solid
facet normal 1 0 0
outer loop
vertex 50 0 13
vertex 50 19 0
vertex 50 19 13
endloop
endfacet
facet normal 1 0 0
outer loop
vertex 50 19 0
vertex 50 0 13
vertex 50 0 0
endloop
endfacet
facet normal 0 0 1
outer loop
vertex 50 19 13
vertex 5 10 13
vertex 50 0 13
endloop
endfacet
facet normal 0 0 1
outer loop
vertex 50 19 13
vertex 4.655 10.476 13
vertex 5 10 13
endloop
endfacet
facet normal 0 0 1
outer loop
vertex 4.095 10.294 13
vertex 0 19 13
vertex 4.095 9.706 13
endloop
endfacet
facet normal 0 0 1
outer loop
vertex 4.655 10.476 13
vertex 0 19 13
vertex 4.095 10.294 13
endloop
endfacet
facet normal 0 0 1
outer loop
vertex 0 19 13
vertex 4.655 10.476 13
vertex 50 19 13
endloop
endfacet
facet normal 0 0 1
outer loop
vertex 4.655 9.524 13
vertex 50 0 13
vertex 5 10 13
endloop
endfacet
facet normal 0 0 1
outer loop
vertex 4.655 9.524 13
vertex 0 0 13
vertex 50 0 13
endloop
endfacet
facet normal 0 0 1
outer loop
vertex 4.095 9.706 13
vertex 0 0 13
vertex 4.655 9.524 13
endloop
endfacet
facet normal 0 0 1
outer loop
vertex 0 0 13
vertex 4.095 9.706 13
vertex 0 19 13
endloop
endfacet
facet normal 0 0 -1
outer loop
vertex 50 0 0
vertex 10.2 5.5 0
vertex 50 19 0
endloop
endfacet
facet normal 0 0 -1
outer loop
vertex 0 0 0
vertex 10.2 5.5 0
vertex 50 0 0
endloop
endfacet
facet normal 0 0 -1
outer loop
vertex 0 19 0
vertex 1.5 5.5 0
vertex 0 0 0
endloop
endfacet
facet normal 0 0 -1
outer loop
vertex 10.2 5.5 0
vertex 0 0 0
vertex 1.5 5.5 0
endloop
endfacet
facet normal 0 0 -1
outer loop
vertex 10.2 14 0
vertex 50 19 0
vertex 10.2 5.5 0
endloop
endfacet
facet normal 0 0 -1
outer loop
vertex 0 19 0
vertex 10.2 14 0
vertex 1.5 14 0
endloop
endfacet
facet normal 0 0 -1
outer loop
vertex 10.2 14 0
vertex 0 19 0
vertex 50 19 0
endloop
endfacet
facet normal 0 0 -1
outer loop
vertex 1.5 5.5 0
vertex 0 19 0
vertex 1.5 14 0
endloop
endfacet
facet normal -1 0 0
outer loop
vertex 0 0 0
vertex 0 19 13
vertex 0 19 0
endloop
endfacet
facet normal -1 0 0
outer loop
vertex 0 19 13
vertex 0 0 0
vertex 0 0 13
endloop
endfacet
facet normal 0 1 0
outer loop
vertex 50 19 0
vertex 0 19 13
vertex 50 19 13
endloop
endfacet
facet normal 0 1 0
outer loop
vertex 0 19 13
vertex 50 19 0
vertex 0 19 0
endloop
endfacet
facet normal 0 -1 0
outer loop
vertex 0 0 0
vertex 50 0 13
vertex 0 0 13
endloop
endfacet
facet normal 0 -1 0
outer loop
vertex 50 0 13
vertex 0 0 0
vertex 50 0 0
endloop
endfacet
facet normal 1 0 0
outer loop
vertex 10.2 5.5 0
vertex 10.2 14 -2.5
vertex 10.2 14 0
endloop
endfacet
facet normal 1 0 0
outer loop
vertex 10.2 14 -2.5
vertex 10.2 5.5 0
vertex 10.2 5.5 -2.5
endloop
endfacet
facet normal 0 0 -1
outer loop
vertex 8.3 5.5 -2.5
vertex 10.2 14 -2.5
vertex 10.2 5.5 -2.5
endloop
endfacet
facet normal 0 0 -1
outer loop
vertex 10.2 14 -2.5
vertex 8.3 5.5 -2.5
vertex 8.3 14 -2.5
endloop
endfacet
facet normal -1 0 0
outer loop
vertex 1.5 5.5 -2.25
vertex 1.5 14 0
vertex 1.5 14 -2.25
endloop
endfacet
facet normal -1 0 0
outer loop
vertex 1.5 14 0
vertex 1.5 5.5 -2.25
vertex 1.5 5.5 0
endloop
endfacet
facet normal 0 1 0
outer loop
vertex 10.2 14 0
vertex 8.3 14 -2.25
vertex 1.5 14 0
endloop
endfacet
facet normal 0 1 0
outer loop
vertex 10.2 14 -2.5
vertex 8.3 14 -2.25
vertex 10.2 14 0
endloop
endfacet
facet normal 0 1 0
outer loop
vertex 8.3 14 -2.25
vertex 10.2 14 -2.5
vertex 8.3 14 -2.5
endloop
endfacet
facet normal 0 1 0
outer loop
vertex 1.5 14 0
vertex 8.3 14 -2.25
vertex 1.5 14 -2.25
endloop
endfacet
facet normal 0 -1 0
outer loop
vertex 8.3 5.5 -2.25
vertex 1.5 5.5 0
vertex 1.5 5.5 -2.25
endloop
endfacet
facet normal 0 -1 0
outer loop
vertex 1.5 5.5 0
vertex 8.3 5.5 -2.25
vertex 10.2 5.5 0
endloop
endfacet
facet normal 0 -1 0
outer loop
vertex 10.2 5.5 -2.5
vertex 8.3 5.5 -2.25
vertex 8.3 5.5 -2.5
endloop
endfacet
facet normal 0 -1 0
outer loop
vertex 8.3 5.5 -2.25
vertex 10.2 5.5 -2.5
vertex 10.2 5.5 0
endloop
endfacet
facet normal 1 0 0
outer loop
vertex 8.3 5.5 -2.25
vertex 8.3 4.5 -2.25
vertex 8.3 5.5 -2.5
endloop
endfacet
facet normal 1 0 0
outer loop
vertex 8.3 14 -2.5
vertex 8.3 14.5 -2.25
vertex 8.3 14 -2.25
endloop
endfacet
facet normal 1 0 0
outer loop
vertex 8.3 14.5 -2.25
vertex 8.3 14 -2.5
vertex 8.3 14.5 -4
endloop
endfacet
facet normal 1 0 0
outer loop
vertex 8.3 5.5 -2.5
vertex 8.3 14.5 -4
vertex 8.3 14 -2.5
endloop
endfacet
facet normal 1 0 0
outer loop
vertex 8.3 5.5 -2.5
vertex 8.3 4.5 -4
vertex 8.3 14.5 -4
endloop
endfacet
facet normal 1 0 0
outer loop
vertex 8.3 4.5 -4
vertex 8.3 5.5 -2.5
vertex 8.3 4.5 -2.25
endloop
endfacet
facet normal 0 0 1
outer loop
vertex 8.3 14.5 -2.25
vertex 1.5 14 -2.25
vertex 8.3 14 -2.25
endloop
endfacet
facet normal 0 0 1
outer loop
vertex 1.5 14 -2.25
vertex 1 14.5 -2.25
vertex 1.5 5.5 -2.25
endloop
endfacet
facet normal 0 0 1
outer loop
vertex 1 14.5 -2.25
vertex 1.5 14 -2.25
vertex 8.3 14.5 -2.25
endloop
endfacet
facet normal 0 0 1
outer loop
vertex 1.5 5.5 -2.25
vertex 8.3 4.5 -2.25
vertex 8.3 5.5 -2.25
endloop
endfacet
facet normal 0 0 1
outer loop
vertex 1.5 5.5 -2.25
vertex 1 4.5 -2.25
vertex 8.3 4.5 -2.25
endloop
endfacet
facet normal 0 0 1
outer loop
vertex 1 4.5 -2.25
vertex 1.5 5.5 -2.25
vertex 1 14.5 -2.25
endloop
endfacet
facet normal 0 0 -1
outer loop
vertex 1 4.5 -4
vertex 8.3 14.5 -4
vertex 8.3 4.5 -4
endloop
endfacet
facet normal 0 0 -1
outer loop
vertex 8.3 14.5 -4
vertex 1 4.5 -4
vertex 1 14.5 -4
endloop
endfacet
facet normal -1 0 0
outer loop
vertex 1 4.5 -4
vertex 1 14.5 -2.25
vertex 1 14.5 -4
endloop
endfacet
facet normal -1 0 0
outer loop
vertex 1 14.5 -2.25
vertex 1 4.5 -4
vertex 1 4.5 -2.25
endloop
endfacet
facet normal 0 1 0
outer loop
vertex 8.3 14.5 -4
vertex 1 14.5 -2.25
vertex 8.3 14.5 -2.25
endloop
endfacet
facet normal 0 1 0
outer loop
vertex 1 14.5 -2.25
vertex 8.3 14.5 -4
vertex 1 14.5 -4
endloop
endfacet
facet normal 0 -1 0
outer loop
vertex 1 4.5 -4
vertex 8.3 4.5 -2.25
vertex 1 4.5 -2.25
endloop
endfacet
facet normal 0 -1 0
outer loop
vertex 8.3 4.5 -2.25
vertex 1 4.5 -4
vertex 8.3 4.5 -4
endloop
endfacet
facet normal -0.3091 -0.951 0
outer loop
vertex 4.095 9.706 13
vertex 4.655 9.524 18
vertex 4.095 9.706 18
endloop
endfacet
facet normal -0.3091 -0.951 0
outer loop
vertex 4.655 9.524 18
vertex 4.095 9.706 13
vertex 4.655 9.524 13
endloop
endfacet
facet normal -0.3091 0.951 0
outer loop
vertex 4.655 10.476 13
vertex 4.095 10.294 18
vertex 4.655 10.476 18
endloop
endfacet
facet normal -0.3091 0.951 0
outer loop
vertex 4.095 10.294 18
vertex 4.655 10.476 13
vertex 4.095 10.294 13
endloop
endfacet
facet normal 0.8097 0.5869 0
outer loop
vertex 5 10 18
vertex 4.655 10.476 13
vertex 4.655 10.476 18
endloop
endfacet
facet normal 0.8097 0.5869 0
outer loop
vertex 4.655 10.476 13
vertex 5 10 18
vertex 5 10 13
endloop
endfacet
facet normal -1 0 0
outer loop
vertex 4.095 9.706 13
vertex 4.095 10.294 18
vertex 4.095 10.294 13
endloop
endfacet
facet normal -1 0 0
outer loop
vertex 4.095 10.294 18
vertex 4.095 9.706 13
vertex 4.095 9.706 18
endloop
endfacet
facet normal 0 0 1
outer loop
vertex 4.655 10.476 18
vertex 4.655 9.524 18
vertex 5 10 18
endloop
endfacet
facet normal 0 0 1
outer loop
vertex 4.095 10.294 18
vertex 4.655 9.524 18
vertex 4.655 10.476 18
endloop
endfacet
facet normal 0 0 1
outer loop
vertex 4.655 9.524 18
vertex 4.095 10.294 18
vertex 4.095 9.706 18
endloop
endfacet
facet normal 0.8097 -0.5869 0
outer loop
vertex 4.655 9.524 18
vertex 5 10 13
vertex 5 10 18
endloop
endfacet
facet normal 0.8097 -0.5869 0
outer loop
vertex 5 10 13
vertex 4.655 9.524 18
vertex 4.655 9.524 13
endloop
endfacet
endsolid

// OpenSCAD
//Basic clip for broken headphones.

//this module is going to be used as a starting point for designing the rest of the clip, will include "bonus" led light diffuser
module BoxContentFootprints(){
//main body
       cube([50,19,13]);

//midsection connecting piece to the (now broken) clip
       translate([1.5,5.5,-2.5]) cube([8.7, 8.5, 2.5]);

//top part of the former clip (broken remaining artifact
       translate([1,4.5,-4]) cube([7.3,10,1.75]);

//placeholder for microphone hotzone
//"hotzone in this case is an area where I absolutely do not want material while designing additional pieces.
       translate([4.5,10,10]) cylinder(d=1,h=8);
}

BoxContentFootprints();
